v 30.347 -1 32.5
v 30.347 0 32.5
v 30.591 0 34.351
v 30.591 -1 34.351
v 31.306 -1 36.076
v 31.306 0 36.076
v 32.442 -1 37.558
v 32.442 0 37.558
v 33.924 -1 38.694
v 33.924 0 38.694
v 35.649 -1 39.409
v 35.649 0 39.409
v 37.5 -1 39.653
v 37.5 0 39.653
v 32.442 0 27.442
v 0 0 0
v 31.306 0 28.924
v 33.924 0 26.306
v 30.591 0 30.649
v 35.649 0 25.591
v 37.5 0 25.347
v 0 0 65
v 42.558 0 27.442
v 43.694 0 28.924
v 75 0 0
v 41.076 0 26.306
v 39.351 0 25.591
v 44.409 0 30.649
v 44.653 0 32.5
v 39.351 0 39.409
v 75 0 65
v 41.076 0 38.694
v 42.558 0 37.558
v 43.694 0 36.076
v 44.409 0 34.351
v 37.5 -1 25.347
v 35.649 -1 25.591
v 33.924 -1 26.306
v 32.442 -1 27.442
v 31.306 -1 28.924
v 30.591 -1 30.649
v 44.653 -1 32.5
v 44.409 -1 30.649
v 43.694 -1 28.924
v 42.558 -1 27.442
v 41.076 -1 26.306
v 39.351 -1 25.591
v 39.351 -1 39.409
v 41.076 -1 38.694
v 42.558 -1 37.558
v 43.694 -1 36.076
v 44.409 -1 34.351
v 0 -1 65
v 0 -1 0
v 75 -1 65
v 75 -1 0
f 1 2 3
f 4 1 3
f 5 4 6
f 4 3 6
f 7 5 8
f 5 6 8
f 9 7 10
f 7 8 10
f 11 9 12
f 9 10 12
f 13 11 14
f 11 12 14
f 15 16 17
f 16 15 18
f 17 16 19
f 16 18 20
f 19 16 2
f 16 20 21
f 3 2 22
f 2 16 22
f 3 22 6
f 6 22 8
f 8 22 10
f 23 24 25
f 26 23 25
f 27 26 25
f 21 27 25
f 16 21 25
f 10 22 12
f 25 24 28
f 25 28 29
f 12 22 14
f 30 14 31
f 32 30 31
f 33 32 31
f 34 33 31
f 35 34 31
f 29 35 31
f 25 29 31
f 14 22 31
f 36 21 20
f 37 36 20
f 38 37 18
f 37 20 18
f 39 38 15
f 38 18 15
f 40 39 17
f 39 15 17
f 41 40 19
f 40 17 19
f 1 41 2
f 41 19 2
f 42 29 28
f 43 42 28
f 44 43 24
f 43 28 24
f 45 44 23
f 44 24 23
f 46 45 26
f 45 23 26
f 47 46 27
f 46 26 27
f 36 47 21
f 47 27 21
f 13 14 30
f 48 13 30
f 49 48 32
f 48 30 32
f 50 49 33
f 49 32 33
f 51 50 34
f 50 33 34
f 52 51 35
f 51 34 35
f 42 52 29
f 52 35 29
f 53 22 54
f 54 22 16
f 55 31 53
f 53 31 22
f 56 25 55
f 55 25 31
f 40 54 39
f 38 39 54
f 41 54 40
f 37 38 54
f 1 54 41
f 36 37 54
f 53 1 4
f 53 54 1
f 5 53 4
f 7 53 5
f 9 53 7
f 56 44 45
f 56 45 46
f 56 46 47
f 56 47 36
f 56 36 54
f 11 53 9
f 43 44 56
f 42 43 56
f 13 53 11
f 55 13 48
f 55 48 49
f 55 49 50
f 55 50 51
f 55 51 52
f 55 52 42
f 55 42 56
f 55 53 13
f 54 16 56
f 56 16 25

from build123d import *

# Parameters (mm, degrees)
F1_DEPTH = 1


with BuildPart() as f1:
    # F0 (on Front) → F1 (new body)
    with BuildSketch(Plane.XZ):
        with BuildLine():
            Line((0, 32.5), (0, 0))
            Line((0, 0), (37.5, 0))
            Line((37.5, 0), (37.5, 25.347329))
            ThreePointArc((37.5, 25.347329), (32.442298, 27.442298), (30.347329, 32.5))
            Line((30.347329, 32.5), (0, 32.5))
        make_face()
        with BuildLine():
            Line((37.5, 25.347329), (37.5, 0))
            Line((37.5, 0), (75, 0))
            Line((75, 0), (75, 32.5))
            Line((75, 32.5), (44.652671, 32.5))
            ThreePointArc((44.652671, 32.5), (42.557702, 27.442298), (37.5, 25.347329))
        make_face()
        with BuildLine():
            Line((0, 65), (0, 32.5))
            Line((0, 32.5), (30.347329, 32.5))
            ThreePointArc((30.347329, 32.5), (32.442298, 37.557702), (37.5, 39.652671))
            Line((37.5, 39.652671), (37.5, 65))
            Line((37.5, 65), (0, 65))
        make_face()
        with BuildLine():
            Line((44.652671, 32.5), (75, 32.5))
            Line((75, 32.5), (75, 65))
            Line((75, 65), (37.5, 65))
            Line((37.5, 65), (37.5, 39.652671))
            ThreePointArc((37.5, 39.652671), (42.557702, 37.557702), (44.652671, 32.5))
        make_face()
    extrude(amount=F1_DEPTH)


solid = f1.part
